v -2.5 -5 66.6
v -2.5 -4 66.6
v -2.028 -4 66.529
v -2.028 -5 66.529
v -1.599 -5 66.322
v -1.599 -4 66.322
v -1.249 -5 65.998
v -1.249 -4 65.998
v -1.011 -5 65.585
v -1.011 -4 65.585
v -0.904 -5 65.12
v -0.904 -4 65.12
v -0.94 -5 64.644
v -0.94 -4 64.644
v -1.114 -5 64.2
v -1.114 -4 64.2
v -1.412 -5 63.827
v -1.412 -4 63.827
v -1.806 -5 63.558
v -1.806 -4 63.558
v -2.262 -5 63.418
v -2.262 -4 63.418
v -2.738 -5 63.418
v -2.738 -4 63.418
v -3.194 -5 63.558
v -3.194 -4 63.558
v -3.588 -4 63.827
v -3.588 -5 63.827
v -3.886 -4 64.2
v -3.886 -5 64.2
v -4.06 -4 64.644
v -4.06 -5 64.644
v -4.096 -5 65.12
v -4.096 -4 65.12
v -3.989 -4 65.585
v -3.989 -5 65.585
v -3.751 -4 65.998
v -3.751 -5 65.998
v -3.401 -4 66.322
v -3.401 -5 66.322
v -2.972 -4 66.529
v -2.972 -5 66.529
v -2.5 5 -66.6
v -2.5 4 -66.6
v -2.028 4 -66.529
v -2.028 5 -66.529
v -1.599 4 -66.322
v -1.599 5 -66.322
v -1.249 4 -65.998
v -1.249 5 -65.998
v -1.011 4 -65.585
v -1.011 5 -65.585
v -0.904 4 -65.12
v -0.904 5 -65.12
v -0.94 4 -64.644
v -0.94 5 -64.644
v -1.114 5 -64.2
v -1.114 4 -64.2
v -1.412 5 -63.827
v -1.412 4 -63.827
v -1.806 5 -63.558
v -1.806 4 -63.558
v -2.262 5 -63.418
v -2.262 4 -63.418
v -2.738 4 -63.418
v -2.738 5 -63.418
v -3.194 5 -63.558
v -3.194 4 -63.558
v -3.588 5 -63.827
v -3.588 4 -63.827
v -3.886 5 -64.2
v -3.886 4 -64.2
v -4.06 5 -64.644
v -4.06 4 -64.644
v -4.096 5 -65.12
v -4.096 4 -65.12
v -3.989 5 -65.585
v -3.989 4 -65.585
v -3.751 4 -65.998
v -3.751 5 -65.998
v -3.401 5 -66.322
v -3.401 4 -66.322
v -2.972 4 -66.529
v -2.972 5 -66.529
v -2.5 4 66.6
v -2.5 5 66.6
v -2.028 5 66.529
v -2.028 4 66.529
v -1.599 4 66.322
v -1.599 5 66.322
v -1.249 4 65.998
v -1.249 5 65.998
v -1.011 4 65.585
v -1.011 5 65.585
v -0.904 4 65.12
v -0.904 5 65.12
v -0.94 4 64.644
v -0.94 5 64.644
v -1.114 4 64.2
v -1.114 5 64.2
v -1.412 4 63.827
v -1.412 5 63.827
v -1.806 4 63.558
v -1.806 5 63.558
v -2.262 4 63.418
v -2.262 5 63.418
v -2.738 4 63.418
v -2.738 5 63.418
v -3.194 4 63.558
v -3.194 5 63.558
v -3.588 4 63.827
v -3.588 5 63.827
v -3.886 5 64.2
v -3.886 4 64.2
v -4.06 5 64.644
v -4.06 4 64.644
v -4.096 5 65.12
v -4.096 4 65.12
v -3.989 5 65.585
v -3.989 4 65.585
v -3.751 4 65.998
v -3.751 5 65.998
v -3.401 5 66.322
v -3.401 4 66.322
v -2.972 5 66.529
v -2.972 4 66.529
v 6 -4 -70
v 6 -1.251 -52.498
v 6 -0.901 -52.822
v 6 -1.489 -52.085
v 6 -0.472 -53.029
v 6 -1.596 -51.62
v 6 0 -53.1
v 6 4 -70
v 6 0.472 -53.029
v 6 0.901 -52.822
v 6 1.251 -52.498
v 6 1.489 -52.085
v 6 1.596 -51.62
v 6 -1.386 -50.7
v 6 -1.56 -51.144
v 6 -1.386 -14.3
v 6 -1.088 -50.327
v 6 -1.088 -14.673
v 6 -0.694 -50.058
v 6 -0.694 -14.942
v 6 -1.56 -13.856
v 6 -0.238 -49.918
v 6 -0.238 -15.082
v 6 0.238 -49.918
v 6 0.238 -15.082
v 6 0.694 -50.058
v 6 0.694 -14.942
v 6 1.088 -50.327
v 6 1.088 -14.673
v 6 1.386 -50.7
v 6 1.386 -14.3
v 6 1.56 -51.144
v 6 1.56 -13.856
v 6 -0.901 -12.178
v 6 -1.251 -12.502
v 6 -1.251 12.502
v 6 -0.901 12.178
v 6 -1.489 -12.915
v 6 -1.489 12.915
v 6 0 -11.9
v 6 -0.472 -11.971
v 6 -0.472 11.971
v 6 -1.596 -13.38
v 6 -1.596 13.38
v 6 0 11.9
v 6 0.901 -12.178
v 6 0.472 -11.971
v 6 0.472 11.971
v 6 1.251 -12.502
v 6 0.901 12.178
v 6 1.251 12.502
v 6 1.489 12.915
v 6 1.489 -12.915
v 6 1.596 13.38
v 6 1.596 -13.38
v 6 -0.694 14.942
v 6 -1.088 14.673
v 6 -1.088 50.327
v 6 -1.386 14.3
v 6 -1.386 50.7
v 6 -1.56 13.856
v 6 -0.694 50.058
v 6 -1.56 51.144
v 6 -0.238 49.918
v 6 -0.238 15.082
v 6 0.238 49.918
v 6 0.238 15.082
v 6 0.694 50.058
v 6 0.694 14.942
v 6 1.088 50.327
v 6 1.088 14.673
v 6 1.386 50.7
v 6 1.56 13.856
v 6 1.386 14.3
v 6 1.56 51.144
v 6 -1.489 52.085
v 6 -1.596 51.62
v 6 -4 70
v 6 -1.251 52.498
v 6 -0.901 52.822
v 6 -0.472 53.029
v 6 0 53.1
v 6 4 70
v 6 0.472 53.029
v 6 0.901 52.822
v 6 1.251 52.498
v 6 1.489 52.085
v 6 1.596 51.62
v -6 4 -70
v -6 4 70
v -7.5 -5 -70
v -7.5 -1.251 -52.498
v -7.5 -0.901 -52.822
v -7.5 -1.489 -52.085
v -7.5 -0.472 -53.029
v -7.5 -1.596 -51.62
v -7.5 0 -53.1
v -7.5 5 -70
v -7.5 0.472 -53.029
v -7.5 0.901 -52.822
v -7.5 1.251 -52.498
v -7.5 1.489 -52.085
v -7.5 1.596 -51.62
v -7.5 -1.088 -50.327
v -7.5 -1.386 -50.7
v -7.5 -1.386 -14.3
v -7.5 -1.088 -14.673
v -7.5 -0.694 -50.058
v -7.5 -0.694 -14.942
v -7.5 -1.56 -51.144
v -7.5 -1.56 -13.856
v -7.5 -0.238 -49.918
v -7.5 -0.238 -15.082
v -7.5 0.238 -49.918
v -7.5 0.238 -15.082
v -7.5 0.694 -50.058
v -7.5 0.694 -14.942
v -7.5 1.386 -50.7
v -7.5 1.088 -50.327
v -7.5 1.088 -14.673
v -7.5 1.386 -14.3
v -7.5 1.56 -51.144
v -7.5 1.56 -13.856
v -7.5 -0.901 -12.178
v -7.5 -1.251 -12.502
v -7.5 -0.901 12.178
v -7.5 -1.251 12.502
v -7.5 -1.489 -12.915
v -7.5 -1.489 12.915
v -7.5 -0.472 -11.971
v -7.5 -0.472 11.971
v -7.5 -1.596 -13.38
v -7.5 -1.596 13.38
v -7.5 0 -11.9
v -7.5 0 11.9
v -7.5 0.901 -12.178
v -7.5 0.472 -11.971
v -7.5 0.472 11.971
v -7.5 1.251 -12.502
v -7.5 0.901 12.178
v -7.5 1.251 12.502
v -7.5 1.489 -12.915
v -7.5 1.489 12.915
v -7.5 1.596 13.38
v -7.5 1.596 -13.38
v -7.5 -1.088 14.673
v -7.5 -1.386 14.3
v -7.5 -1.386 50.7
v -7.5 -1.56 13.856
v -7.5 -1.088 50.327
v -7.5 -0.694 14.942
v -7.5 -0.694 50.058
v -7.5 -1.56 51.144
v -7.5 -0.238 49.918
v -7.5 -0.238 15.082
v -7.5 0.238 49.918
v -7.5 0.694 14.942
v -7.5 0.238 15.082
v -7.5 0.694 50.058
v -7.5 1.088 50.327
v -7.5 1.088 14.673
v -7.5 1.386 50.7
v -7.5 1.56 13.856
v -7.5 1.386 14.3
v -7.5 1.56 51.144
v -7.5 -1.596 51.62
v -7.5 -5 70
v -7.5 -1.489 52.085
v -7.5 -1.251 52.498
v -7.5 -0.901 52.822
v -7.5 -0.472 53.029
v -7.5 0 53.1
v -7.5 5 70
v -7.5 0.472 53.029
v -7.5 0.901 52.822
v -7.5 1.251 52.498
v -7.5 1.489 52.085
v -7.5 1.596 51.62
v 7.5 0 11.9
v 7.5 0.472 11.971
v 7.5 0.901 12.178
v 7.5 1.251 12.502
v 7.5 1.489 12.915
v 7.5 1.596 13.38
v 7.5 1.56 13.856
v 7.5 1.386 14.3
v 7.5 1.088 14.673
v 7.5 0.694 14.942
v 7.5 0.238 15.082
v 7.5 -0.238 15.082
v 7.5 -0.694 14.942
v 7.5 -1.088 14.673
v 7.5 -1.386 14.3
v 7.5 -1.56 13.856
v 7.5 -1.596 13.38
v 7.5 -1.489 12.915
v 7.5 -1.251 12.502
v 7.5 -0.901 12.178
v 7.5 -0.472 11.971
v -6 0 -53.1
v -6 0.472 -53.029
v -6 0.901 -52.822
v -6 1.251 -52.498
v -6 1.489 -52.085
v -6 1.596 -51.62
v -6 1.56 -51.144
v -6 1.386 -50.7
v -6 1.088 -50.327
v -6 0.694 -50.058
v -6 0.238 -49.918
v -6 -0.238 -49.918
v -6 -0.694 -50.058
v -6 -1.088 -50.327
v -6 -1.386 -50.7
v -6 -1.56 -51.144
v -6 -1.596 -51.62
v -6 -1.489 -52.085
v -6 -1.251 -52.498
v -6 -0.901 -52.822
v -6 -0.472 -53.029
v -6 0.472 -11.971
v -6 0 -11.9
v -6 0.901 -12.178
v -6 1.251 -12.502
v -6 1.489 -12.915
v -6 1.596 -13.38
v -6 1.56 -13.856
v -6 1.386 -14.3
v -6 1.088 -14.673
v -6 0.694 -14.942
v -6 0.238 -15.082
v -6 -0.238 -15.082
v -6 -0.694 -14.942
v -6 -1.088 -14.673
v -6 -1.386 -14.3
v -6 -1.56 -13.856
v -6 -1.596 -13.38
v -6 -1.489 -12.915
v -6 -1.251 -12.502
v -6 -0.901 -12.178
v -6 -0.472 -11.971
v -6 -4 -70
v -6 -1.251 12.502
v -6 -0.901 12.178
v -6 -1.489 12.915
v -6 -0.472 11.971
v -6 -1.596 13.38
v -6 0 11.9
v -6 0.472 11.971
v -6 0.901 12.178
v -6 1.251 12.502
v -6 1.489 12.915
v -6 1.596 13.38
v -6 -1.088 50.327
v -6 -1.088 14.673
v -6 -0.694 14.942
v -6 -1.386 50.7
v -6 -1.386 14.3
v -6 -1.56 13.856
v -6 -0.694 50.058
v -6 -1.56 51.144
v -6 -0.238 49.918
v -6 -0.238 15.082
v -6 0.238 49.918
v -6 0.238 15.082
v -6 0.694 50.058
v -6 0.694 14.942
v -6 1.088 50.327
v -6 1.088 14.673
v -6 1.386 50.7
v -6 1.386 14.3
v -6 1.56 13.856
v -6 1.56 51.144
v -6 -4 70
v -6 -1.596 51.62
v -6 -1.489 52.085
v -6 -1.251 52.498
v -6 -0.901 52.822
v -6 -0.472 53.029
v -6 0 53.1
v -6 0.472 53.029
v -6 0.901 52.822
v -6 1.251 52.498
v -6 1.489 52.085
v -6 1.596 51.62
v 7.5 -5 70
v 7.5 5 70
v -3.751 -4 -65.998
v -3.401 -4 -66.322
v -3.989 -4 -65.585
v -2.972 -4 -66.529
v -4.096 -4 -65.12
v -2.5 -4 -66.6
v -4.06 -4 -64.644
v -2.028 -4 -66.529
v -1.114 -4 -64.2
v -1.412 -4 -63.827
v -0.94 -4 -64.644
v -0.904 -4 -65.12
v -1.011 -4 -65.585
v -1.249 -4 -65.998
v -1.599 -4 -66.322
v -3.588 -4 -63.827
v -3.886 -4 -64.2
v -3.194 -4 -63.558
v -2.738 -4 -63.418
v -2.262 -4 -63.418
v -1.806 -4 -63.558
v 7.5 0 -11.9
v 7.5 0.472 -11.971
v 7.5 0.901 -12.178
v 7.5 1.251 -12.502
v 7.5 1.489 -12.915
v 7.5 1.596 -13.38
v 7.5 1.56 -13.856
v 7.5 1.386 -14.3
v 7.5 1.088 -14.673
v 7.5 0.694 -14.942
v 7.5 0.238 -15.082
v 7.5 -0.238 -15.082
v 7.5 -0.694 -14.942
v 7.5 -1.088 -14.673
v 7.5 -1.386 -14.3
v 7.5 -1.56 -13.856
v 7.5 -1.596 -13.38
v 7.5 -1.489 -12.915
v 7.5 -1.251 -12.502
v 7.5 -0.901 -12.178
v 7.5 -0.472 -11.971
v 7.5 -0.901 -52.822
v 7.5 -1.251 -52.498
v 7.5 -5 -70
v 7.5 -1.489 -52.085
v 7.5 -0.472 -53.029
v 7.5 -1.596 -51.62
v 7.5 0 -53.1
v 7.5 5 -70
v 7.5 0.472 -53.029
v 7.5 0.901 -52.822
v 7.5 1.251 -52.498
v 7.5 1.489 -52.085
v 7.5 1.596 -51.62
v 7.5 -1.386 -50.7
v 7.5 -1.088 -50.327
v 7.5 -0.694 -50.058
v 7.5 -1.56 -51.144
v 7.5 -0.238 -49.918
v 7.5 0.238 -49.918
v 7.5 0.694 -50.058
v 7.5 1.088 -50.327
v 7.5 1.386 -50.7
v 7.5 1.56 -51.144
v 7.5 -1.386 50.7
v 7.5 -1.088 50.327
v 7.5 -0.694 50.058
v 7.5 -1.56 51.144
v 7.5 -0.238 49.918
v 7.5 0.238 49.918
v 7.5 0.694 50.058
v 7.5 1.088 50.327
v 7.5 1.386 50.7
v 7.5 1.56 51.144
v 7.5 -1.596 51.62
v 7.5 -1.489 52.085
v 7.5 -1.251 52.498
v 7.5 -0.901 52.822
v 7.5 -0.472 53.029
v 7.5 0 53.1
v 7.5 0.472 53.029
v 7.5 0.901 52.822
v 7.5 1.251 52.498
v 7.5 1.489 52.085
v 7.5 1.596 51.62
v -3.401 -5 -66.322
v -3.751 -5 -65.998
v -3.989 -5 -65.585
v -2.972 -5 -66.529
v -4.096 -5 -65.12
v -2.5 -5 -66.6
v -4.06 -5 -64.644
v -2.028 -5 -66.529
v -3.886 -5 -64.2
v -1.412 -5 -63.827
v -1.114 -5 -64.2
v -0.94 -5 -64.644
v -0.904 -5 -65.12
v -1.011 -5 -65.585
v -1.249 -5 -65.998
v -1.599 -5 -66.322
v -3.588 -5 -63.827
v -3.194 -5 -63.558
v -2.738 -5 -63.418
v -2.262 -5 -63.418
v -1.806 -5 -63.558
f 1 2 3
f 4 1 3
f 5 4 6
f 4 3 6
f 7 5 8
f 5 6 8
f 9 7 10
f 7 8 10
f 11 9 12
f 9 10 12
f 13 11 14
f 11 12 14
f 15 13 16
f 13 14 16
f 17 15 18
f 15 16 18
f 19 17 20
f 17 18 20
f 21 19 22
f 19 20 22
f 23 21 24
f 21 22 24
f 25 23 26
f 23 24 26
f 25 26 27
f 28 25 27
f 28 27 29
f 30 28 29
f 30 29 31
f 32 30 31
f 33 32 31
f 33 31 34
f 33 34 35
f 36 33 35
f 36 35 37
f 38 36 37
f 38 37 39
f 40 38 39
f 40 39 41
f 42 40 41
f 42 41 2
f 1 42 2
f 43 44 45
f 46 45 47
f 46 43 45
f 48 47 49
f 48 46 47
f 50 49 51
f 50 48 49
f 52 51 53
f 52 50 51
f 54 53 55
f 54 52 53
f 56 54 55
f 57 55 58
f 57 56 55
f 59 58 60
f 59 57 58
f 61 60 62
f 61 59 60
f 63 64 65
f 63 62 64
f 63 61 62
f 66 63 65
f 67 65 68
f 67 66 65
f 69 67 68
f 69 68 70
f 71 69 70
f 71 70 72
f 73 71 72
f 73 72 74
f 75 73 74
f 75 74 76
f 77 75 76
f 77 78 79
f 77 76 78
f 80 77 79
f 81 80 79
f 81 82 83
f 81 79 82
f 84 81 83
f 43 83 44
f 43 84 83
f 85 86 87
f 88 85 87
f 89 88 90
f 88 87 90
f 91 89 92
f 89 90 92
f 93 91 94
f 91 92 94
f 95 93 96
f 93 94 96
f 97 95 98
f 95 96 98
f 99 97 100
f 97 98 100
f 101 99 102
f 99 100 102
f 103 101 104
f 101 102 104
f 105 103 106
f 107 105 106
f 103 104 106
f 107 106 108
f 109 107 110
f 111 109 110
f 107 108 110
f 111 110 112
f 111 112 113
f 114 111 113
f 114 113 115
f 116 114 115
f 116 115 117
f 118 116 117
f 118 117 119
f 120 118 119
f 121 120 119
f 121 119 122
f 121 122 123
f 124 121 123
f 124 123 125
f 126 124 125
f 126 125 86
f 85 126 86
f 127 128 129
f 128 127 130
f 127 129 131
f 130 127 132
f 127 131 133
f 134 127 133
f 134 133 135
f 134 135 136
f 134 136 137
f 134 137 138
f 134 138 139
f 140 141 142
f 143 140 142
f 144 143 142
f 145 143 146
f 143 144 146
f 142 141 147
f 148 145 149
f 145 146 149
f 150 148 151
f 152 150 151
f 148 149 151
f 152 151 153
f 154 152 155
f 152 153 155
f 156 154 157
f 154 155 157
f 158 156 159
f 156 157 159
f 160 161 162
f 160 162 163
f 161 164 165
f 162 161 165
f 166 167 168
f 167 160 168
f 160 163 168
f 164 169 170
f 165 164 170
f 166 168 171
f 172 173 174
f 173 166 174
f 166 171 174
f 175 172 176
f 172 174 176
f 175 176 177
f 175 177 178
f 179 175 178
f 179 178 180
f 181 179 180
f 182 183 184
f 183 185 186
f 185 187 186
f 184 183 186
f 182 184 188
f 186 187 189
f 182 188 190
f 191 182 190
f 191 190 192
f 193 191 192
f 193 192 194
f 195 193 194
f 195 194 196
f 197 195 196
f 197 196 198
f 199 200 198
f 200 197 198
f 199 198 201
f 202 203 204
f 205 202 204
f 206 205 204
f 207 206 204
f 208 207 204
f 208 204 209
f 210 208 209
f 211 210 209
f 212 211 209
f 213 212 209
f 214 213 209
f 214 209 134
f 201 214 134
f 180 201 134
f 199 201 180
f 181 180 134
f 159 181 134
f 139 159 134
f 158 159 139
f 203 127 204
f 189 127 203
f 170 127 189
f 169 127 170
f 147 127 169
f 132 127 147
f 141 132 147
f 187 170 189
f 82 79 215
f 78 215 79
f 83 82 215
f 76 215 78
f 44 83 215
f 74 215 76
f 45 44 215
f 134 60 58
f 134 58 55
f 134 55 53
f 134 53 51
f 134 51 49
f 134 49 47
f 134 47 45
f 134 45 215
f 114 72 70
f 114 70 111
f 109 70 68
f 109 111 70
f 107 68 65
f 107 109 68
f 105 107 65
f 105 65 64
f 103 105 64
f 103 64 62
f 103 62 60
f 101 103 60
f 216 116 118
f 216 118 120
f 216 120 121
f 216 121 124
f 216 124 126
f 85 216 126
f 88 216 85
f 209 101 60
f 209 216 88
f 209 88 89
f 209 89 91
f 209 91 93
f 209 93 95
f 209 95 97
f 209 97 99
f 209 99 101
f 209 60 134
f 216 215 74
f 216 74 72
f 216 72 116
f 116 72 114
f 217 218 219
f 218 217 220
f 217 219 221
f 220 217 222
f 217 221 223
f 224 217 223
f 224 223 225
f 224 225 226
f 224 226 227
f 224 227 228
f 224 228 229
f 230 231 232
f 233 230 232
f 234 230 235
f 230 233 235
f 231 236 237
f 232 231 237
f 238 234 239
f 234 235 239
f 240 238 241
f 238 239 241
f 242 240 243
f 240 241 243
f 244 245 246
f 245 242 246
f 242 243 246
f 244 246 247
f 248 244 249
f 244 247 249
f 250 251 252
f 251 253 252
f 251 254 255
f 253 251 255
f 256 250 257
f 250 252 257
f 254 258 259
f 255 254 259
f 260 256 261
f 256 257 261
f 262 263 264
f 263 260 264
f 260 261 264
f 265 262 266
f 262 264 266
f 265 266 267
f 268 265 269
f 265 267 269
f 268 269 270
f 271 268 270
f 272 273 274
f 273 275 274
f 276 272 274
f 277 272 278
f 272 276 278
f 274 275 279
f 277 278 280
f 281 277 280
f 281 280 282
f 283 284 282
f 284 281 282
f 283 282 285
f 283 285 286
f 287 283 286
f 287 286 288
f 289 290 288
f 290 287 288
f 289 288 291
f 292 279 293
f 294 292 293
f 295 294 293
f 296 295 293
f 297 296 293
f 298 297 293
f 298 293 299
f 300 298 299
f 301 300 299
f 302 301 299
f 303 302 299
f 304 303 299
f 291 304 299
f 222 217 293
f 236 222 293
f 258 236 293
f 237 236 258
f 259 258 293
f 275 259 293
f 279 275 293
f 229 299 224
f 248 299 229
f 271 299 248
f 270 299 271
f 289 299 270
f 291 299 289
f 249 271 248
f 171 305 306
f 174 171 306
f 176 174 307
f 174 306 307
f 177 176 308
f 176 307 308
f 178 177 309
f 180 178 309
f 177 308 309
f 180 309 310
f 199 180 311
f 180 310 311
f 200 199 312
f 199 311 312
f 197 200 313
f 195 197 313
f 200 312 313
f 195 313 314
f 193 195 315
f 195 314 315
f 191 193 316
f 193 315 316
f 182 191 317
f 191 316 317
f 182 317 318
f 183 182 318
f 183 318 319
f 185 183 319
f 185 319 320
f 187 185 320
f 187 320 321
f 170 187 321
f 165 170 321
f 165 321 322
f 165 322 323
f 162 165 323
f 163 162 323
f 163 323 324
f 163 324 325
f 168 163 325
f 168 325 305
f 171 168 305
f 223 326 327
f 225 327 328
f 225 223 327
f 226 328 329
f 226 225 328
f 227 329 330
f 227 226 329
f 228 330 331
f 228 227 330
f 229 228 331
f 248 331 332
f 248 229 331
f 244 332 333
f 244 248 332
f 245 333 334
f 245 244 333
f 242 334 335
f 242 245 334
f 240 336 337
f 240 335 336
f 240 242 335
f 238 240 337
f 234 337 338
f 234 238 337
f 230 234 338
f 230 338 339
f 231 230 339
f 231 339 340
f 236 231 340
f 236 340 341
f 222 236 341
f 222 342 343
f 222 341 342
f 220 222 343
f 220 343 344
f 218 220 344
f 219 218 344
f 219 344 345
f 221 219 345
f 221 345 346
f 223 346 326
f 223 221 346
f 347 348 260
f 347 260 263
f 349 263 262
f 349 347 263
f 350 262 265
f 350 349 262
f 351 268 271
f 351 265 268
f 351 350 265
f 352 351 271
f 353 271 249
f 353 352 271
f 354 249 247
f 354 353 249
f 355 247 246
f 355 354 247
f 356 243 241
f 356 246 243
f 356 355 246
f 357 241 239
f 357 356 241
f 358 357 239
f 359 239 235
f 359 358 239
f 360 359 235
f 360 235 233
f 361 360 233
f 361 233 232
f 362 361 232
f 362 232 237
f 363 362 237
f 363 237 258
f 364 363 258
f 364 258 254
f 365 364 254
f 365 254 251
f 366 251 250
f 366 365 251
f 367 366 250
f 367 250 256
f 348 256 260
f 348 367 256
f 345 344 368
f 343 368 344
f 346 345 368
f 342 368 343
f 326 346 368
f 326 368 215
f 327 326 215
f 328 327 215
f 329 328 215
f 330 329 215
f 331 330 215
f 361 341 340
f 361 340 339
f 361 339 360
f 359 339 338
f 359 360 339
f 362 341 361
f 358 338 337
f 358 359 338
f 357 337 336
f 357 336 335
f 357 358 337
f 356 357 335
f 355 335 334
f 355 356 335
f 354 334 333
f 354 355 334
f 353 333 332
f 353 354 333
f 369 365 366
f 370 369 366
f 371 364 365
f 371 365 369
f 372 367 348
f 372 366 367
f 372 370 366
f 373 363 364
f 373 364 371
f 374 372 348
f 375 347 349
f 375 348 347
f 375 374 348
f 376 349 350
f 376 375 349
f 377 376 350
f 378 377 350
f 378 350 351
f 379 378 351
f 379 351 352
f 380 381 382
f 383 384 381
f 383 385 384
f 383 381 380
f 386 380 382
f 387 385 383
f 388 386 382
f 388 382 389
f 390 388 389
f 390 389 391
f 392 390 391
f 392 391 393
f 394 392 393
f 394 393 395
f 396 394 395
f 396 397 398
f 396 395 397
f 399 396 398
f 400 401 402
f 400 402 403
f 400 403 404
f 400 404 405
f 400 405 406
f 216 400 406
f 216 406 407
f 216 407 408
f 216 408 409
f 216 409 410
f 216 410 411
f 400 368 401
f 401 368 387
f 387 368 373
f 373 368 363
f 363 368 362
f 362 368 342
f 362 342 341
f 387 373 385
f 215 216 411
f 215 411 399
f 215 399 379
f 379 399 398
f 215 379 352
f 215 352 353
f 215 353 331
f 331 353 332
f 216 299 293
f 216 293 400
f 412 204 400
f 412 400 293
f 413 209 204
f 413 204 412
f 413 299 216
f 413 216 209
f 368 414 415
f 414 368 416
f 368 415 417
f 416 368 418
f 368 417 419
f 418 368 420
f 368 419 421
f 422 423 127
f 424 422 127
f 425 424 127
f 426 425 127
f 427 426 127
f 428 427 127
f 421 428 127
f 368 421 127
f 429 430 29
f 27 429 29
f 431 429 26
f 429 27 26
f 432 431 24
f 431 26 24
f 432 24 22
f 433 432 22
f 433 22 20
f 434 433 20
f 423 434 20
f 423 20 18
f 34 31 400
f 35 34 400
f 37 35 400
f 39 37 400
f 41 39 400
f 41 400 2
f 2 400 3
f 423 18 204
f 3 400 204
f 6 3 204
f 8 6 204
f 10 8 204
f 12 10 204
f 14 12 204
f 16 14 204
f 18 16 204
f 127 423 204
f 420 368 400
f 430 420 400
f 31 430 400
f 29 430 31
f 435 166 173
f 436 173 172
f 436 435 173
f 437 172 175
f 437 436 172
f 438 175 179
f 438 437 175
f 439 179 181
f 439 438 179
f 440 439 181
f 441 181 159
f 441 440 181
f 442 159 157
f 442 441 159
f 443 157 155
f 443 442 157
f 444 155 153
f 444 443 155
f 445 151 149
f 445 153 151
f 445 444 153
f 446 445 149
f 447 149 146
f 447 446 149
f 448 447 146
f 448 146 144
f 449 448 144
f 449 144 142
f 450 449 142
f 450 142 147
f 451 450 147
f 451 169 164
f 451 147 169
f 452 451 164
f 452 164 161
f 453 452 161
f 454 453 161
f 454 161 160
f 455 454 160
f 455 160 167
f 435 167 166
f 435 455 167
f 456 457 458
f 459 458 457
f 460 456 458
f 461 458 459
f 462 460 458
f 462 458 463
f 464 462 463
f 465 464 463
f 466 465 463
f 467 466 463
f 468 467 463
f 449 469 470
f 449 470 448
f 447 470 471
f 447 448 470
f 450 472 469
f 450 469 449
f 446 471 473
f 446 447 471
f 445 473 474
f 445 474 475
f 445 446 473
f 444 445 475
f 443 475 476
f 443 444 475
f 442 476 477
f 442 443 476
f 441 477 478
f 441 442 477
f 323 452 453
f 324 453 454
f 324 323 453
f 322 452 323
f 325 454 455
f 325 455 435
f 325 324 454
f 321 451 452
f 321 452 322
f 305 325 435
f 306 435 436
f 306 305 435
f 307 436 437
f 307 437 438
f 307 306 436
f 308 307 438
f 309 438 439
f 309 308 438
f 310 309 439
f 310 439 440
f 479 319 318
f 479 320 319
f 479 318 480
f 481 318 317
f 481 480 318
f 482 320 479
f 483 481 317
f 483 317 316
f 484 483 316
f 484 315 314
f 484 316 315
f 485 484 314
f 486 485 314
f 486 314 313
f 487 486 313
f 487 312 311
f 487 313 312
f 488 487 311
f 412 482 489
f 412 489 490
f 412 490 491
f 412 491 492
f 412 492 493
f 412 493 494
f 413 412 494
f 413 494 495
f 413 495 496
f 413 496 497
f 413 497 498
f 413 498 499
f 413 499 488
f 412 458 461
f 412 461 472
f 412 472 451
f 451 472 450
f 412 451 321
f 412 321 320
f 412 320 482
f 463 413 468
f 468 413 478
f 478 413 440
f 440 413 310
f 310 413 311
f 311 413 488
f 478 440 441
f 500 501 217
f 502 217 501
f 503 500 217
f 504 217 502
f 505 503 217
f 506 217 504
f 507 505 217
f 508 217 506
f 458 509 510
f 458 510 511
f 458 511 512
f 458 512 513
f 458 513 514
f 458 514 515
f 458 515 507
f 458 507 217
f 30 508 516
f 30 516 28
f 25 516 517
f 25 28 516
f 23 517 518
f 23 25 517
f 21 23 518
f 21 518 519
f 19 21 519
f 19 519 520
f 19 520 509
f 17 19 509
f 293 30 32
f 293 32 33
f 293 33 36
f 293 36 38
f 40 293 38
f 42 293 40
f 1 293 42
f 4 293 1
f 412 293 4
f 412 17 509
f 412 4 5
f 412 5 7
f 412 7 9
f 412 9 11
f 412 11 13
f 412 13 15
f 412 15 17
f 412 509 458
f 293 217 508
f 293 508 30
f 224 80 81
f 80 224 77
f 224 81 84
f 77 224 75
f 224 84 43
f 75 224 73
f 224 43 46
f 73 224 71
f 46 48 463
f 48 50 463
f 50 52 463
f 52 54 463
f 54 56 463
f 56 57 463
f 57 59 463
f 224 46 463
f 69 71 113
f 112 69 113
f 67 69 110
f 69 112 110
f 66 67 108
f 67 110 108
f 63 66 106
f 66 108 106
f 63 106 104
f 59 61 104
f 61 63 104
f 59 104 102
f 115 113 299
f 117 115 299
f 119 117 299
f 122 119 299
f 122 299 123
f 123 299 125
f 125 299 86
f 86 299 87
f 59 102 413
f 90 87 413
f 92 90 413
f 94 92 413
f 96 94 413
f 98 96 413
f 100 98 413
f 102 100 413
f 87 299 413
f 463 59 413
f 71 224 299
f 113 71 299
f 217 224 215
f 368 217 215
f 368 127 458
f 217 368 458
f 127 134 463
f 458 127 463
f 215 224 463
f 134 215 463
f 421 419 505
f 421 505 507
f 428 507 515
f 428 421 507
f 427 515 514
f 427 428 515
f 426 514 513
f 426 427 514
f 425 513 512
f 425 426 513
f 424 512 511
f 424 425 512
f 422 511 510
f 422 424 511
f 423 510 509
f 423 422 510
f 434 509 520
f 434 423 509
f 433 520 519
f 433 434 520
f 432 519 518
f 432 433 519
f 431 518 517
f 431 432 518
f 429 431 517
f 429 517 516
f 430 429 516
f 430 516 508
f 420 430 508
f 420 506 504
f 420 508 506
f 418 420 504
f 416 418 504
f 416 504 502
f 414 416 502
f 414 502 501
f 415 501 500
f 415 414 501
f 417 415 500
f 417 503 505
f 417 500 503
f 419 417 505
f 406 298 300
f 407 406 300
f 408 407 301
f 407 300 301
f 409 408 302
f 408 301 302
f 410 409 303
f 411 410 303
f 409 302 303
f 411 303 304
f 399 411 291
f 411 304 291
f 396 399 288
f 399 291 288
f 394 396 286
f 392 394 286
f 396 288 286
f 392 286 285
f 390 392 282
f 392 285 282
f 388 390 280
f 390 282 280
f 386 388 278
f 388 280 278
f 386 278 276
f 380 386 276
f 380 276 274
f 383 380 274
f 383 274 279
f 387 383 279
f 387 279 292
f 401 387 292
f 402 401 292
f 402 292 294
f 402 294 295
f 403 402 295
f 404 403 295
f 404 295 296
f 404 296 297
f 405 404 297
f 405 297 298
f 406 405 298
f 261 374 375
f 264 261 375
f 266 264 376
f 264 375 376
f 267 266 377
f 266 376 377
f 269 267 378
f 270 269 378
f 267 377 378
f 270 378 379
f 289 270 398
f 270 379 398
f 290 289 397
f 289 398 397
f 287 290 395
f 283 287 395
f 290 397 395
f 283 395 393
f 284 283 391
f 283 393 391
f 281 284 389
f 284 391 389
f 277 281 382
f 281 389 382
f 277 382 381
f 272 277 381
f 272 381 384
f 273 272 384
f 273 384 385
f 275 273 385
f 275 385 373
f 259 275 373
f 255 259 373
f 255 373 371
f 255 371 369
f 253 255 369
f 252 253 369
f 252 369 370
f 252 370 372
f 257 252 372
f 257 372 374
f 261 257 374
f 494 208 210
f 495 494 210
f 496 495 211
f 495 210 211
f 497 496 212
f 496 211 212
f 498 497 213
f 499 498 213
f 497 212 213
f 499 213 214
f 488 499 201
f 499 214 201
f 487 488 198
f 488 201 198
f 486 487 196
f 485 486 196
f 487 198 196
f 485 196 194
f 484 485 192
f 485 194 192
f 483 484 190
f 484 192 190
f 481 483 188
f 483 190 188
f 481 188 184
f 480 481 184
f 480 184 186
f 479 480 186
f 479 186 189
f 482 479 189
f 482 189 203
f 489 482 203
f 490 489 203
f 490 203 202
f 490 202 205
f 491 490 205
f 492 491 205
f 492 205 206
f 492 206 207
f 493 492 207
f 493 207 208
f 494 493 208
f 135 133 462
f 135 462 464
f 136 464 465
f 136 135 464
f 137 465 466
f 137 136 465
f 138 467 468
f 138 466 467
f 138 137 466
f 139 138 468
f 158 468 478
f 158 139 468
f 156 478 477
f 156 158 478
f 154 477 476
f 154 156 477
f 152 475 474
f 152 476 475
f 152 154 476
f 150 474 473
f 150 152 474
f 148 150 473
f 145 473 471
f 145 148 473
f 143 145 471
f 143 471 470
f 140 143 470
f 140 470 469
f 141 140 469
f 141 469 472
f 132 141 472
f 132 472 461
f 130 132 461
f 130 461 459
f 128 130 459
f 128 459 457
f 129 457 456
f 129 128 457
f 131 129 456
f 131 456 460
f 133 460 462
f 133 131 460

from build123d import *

# Parameters (mm, degrees)
SKETCH_1_W          = 15
SKETCH_1_H          = 10
SKETCH_1_W_2        = 12
SKETCH_1_H_2        = 8
EXTRUDE_1_DEPTH     = 70
SKETCH_2_R          = 1.6
CUT_EXTRUDE_1_DEPTH = 72.763500472
SKETCH_3_R          = 1.6
CUT_EXTRUDE_2_DEPTH = 72.107313267
SKETCH_4_R          = 1.6
CUT_EXTRUDE_3_DEPTH = 72.763500472


with BuildPart() as part:
    # ｽｹｯﾁ1 → ﾎﾞｽ - 押し出し1 (new body)
    with BuildSketch(Plane.XY):
        Rectangle(SKETCH_1_W, SKETCH_1_H)
        Rectangle(SKETCH_1_W_2, SKETCH_1_H_2, mode=Mode.SUBTRACT)
    extrude_1 = extrude(amount=EXTRUDE_1_DEPTH)

    # ｽｹｯﾁ2 → ｶｯﾄ - 押し出し1 (cut, through all)
    with BuildSketch(Plane(origin=(7.5, 0, 0), x_dir=(0, 0, -1), z_dir=(1, 0, 0))):
        with Locations((-13.5, 0)):
            Circle(SKETCH_2_R)
    cut_extrude_1 = extrude(amount=-CUT_EXTRUDE_1_DEPTH, mode=Mode.SUBTRACT)

    # ｽｹｯﾁ3 → ｶｯﾄ - 押し出し2 (cut, through all)
    with BuildSketch(Plane(origin=(0, 5, 0), x_dir=(1, 0, 0), z_dir=(0, 1, 0))):
        with Locations(Location((-2.5, -65, 0), (0, 0, 270))):
            Circle(SKETCH_3_R)
    cut_extrude_2 = extrude(amount=-CUT_EXTRUDE_2_DEPTH, mode=Mode.SUBTRACT)

    # ｽｹｯﾁ4 → ｶｯﾄ - 押し出し3 (cut, through all)
    with BuildSketch(Plane.ZY.offset(7.5)):
        with Locations((51.5, 0)):
            Circle(SKETCH_4_R)
    cut_extrude_3 = extrude(amount=-CUT_EXTRUDE_3_DEPTH, mode=Mode.SUBTRACT)

    # ﾐﾗｰ1: ﾎﾞｽ - 押し出し1, ｶｯﾄ - 押し出し1, ｶｯﾄ - 押し出し2, ｶｯﾄ - 押し出し3 across plane
    add(extrude_1.mirror(Plane(origin=(0, 0, 0), x_dir=(1, 0, 0), z_dir=(0, 0, -1))))
    add(cut_extrude_1.mirror(Plane(origin=(0, 0, 0), x_dir=(1, 0, 0), z_dir=(0, 0, -1))), mode=Mode.SUBTRACT)
    add(cut_extrude_2.mirror(Plane(origin=(0, 0, 0), x_dir=(1, 0, 0), z_dir=(0, 0, -1))), mode=Mode.SUBTRACT)
    add(cut_extrude_3.mirror(Plane(origin=(0, 0, 0), x_dir=(1, 0, 0), z_dir=(0, 0, -1))), mode=Mode.SUBTRACT)


solid = part.part
